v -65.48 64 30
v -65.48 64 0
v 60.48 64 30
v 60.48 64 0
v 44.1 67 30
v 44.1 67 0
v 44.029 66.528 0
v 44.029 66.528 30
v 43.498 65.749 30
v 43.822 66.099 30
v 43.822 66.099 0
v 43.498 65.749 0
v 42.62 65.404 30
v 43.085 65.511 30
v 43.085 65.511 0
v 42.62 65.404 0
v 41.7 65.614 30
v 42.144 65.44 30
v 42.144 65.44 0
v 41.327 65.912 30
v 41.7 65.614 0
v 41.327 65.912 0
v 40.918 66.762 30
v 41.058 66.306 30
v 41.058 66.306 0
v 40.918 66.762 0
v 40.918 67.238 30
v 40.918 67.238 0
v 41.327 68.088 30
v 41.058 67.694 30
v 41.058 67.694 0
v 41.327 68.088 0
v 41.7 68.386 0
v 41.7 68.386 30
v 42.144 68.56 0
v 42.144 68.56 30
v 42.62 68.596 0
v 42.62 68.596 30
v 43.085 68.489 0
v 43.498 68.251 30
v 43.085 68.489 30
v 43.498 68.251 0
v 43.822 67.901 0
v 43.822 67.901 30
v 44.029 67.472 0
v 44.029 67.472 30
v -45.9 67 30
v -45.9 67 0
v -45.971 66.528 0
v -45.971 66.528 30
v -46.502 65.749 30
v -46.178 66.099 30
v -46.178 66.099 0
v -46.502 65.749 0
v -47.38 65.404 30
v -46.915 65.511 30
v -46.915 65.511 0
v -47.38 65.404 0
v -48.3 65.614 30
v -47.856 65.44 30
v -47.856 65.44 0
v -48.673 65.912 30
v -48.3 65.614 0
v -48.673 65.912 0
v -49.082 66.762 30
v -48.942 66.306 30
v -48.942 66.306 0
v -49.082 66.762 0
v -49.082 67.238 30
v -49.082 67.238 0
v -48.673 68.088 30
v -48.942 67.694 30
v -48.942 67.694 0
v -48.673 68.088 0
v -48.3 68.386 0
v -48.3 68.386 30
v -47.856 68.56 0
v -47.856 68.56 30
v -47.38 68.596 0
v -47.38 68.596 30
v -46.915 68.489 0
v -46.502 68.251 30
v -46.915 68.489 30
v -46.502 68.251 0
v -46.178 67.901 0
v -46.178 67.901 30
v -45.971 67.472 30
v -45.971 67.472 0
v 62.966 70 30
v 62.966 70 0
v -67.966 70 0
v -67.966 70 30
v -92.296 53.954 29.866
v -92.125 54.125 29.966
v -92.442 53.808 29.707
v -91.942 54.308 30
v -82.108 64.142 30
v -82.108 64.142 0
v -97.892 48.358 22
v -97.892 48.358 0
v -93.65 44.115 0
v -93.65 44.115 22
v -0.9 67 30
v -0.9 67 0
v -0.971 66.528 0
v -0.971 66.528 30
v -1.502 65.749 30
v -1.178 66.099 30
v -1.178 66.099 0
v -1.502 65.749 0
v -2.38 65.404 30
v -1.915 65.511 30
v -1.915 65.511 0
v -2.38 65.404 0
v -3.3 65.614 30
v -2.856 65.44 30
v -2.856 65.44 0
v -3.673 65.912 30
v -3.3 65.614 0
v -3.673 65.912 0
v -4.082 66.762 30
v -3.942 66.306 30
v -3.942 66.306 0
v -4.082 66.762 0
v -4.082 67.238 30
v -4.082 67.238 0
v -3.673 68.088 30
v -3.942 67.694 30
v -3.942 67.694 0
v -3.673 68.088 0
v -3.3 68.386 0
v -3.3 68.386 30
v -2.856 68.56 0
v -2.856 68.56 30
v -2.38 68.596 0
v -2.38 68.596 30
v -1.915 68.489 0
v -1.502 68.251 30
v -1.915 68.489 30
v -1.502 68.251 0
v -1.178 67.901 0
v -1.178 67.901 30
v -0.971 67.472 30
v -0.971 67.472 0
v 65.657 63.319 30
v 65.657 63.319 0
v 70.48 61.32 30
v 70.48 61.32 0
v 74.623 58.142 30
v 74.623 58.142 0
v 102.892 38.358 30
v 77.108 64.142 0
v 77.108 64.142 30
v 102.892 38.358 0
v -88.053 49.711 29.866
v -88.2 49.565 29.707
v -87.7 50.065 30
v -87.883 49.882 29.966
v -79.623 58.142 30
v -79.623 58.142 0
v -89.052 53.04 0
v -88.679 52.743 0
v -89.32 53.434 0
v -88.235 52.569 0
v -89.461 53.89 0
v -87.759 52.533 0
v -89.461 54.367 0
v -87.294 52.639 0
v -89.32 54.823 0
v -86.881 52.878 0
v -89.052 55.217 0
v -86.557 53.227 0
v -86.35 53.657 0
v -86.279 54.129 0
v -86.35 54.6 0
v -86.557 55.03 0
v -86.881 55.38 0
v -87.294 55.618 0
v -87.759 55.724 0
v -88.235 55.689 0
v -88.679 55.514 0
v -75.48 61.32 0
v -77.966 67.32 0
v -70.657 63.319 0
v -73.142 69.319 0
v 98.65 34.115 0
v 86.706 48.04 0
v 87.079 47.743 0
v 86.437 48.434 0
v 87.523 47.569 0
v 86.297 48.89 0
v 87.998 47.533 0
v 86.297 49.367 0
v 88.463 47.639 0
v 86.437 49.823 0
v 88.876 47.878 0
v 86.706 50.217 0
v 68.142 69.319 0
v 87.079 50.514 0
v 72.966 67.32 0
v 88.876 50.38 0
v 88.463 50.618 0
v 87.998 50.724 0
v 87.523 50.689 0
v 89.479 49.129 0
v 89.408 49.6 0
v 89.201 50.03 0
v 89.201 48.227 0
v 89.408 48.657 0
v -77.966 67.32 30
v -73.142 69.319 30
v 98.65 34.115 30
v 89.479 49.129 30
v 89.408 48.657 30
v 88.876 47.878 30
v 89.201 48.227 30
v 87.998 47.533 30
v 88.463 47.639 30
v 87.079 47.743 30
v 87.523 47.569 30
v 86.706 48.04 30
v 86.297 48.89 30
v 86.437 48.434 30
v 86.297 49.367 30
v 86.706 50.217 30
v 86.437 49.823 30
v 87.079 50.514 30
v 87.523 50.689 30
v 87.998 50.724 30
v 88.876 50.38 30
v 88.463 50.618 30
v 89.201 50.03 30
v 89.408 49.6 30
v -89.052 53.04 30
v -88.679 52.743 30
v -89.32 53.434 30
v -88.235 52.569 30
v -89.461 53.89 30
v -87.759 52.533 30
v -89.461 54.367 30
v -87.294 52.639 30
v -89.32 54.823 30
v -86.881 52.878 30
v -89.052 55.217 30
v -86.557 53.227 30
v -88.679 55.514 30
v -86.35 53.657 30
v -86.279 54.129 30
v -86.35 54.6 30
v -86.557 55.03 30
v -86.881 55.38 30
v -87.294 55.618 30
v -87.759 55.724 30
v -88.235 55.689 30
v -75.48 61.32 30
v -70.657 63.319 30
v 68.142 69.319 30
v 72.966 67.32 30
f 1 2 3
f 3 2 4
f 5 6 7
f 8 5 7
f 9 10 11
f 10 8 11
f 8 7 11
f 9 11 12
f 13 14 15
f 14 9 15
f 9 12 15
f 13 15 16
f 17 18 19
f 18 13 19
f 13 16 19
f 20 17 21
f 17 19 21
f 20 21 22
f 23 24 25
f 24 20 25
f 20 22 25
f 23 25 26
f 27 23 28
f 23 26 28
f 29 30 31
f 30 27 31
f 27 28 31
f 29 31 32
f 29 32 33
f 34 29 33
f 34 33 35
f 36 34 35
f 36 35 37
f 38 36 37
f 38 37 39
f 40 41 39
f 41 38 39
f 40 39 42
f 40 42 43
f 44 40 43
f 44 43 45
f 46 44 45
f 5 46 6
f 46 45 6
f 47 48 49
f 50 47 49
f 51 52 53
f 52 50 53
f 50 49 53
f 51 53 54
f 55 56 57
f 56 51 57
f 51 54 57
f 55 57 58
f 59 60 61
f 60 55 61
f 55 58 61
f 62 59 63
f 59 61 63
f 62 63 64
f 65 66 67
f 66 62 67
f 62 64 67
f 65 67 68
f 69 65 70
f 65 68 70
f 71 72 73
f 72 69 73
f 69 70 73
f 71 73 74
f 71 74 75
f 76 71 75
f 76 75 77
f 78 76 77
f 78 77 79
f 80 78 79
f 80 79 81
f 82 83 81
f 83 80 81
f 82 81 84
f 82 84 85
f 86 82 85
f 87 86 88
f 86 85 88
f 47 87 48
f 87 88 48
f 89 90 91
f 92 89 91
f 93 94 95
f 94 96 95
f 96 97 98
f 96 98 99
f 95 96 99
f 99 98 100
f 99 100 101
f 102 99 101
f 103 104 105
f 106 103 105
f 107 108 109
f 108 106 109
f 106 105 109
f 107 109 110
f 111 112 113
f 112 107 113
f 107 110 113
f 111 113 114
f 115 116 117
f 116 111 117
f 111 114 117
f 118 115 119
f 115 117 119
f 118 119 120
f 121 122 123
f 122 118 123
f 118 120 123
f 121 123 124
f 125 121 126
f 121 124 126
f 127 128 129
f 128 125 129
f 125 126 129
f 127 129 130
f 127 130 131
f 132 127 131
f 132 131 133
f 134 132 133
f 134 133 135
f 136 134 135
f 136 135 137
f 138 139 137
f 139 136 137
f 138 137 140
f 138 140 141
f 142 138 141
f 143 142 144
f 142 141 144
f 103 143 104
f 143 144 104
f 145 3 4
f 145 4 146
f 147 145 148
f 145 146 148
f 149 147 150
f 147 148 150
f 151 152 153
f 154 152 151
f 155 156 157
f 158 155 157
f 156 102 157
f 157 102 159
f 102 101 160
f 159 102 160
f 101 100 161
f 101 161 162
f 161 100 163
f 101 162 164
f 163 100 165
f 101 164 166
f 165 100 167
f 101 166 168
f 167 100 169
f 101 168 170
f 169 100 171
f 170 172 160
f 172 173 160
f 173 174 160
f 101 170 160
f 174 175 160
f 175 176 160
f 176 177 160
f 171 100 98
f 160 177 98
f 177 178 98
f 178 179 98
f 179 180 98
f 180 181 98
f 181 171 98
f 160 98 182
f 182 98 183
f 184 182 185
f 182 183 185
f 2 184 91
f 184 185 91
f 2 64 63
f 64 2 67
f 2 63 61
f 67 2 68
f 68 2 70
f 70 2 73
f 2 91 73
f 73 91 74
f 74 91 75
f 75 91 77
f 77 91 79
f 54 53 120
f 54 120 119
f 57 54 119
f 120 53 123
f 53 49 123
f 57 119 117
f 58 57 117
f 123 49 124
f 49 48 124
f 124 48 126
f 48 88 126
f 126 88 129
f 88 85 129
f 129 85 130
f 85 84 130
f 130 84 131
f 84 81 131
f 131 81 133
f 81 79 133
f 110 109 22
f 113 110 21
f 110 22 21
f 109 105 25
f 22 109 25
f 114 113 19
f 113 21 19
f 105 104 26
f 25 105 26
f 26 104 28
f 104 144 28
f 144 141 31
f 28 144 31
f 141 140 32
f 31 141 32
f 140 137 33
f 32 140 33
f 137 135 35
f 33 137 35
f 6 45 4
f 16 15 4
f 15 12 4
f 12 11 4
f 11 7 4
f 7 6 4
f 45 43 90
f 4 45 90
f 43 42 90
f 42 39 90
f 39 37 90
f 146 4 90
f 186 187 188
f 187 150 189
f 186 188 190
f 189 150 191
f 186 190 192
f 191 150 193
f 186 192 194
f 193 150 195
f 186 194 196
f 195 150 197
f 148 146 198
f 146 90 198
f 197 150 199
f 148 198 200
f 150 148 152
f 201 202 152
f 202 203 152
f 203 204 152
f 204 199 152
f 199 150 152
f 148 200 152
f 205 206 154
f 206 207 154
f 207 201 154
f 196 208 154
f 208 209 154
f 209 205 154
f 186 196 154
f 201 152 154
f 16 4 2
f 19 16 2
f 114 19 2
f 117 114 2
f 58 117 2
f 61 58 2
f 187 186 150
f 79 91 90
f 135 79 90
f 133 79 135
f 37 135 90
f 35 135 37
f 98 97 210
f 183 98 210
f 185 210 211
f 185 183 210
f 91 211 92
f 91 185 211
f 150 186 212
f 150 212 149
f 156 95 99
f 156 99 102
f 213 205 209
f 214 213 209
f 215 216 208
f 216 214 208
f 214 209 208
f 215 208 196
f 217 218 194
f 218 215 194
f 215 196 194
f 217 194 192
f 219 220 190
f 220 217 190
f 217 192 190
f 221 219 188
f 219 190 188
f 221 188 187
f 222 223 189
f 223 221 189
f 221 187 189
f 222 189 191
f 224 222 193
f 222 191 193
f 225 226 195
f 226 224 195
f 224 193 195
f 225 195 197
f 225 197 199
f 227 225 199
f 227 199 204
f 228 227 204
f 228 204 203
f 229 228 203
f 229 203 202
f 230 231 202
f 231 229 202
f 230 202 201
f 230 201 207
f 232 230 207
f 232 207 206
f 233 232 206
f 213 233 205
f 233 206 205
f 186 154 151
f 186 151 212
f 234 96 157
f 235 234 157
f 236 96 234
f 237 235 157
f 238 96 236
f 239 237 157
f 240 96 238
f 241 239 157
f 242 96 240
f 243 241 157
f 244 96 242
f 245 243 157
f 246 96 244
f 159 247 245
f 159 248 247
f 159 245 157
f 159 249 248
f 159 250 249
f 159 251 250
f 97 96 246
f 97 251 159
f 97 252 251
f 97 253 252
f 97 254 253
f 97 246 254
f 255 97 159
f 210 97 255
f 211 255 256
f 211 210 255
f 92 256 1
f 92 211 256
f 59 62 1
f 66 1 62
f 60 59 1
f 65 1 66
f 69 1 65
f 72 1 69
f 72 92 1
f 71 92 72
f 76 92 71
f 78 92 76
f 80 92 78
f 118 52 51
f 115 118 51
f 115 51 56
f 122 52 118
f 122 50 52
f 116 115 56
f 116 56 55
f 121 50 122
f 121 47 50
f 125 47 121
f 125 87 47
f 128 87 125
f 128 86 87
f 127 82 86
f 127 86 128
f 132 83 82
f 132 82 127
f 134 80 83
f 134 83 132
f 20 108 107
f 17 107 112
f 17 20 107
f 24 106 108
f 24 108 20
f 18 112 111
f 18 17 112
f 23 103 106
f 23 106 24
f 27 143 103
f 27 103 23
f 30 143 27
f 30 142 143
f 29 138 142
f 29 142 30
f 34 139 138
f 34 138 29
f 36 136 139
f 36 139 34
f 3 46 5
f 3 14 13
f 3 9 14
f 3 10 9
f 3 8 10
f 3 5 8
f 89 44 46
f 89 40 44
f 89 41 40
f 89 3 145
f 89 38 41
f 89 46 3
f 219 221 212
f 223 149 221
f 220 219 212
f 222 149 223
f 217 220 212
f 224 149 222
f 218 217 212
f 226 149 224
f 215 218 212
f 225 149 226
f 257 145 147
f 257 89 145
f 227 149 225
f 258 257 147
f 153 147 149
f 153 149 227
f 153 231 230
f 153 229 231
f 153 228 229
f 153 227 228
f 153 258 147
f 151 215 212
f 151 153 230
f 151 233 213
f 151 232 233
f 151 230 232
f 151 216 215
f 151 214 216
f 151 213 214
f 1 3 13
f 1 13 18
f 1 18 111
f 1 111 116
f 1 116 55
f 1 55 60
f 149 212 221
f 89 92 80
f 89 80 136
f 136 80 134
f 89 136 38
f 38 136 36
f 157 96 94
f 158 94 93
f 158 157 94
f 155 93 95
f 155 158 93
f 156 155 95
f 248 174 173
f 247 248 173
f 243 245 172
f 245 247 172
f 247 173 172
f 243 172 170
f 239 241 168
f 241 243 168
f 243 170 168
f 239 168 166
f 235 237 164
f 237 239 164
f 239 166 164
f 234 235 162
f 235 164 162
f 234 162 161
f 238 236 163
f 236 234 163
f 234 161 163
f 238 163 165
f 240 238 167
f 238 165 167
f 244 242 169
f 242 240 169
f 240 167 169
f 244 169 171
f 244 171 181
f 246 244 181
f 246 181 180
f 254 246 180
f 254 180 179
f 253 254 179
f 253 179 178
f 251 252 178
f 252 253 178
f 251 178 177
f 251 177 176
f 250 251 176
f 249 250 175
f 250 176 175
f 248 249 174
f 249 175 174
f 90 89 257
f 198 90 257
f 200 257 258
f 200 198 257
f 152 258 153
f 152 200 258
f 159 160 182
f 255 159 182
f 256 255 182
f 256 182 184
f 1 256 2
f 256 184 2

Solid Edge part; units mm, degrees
sketch "Sketch1" plane through (0, 0, 0) normal (0, 0, 1) x (1, 0, 0)
  line L0 (-65.4804, 64) -> (60.4804, 64)
  arc A0 (60.4804, 64) -> (74.6226, 58.1421) centre (60.4804, 44) cw
  line L1 (98.6495, 34.1152) -> (74.6226, 58.1421)
  line L2 (102.8921, 38.3579) -> (98.6495, 34.1152)
  line L3 (77.1079, 64.1421) -> (102.8921, 38.3579)
  arc A1 (62.9657, 70) -> (77.1079, 64.1421) centre (62.9657, 50) cw
  line L4 (62.9657, 70) -> (-67.9657, 70)
  arc A2 (-82.1079, 64.1421) -> (-67.9657, 70) centre (-67.9657, 50) cw
  line L5 (-82.1079, 64.1421) -> (-97.8921, 48.3579)
  line L6 (-97.8921, 48.3579) -> (-93.6495, 44.1152)
  line L7 (-93.6495, 44.1152) -> (-79.6226, 58.1421)
  arc A3 (-79.6226, 58.1421) -> (-65.4804, 64) centre (-65.4804, 44) cw
  circle A4 centre (-47.5, 67) radius 1.6
  circle A5 centre (-87.8787, 54.1287) radius 1.6
  circle A6 centre (-2.5, 67) radius 1.6
  circle A7 centre (42.5, 67) radius 1.6
  circle A8 centre (87.8787, 49.1287) radius 1.6
extrude "Protrusion1" add sketch "Sketch1" along normal blind 30
chamfer "Chamfer_1" distance 8 angle 45 1 edges at (-95.7708, 46.2365, 30) measured on face at (-66.4359, 64.378, 30)
fillet "Round_7" radius 1 1 edges at (-90.114, 51.8934, 30)
